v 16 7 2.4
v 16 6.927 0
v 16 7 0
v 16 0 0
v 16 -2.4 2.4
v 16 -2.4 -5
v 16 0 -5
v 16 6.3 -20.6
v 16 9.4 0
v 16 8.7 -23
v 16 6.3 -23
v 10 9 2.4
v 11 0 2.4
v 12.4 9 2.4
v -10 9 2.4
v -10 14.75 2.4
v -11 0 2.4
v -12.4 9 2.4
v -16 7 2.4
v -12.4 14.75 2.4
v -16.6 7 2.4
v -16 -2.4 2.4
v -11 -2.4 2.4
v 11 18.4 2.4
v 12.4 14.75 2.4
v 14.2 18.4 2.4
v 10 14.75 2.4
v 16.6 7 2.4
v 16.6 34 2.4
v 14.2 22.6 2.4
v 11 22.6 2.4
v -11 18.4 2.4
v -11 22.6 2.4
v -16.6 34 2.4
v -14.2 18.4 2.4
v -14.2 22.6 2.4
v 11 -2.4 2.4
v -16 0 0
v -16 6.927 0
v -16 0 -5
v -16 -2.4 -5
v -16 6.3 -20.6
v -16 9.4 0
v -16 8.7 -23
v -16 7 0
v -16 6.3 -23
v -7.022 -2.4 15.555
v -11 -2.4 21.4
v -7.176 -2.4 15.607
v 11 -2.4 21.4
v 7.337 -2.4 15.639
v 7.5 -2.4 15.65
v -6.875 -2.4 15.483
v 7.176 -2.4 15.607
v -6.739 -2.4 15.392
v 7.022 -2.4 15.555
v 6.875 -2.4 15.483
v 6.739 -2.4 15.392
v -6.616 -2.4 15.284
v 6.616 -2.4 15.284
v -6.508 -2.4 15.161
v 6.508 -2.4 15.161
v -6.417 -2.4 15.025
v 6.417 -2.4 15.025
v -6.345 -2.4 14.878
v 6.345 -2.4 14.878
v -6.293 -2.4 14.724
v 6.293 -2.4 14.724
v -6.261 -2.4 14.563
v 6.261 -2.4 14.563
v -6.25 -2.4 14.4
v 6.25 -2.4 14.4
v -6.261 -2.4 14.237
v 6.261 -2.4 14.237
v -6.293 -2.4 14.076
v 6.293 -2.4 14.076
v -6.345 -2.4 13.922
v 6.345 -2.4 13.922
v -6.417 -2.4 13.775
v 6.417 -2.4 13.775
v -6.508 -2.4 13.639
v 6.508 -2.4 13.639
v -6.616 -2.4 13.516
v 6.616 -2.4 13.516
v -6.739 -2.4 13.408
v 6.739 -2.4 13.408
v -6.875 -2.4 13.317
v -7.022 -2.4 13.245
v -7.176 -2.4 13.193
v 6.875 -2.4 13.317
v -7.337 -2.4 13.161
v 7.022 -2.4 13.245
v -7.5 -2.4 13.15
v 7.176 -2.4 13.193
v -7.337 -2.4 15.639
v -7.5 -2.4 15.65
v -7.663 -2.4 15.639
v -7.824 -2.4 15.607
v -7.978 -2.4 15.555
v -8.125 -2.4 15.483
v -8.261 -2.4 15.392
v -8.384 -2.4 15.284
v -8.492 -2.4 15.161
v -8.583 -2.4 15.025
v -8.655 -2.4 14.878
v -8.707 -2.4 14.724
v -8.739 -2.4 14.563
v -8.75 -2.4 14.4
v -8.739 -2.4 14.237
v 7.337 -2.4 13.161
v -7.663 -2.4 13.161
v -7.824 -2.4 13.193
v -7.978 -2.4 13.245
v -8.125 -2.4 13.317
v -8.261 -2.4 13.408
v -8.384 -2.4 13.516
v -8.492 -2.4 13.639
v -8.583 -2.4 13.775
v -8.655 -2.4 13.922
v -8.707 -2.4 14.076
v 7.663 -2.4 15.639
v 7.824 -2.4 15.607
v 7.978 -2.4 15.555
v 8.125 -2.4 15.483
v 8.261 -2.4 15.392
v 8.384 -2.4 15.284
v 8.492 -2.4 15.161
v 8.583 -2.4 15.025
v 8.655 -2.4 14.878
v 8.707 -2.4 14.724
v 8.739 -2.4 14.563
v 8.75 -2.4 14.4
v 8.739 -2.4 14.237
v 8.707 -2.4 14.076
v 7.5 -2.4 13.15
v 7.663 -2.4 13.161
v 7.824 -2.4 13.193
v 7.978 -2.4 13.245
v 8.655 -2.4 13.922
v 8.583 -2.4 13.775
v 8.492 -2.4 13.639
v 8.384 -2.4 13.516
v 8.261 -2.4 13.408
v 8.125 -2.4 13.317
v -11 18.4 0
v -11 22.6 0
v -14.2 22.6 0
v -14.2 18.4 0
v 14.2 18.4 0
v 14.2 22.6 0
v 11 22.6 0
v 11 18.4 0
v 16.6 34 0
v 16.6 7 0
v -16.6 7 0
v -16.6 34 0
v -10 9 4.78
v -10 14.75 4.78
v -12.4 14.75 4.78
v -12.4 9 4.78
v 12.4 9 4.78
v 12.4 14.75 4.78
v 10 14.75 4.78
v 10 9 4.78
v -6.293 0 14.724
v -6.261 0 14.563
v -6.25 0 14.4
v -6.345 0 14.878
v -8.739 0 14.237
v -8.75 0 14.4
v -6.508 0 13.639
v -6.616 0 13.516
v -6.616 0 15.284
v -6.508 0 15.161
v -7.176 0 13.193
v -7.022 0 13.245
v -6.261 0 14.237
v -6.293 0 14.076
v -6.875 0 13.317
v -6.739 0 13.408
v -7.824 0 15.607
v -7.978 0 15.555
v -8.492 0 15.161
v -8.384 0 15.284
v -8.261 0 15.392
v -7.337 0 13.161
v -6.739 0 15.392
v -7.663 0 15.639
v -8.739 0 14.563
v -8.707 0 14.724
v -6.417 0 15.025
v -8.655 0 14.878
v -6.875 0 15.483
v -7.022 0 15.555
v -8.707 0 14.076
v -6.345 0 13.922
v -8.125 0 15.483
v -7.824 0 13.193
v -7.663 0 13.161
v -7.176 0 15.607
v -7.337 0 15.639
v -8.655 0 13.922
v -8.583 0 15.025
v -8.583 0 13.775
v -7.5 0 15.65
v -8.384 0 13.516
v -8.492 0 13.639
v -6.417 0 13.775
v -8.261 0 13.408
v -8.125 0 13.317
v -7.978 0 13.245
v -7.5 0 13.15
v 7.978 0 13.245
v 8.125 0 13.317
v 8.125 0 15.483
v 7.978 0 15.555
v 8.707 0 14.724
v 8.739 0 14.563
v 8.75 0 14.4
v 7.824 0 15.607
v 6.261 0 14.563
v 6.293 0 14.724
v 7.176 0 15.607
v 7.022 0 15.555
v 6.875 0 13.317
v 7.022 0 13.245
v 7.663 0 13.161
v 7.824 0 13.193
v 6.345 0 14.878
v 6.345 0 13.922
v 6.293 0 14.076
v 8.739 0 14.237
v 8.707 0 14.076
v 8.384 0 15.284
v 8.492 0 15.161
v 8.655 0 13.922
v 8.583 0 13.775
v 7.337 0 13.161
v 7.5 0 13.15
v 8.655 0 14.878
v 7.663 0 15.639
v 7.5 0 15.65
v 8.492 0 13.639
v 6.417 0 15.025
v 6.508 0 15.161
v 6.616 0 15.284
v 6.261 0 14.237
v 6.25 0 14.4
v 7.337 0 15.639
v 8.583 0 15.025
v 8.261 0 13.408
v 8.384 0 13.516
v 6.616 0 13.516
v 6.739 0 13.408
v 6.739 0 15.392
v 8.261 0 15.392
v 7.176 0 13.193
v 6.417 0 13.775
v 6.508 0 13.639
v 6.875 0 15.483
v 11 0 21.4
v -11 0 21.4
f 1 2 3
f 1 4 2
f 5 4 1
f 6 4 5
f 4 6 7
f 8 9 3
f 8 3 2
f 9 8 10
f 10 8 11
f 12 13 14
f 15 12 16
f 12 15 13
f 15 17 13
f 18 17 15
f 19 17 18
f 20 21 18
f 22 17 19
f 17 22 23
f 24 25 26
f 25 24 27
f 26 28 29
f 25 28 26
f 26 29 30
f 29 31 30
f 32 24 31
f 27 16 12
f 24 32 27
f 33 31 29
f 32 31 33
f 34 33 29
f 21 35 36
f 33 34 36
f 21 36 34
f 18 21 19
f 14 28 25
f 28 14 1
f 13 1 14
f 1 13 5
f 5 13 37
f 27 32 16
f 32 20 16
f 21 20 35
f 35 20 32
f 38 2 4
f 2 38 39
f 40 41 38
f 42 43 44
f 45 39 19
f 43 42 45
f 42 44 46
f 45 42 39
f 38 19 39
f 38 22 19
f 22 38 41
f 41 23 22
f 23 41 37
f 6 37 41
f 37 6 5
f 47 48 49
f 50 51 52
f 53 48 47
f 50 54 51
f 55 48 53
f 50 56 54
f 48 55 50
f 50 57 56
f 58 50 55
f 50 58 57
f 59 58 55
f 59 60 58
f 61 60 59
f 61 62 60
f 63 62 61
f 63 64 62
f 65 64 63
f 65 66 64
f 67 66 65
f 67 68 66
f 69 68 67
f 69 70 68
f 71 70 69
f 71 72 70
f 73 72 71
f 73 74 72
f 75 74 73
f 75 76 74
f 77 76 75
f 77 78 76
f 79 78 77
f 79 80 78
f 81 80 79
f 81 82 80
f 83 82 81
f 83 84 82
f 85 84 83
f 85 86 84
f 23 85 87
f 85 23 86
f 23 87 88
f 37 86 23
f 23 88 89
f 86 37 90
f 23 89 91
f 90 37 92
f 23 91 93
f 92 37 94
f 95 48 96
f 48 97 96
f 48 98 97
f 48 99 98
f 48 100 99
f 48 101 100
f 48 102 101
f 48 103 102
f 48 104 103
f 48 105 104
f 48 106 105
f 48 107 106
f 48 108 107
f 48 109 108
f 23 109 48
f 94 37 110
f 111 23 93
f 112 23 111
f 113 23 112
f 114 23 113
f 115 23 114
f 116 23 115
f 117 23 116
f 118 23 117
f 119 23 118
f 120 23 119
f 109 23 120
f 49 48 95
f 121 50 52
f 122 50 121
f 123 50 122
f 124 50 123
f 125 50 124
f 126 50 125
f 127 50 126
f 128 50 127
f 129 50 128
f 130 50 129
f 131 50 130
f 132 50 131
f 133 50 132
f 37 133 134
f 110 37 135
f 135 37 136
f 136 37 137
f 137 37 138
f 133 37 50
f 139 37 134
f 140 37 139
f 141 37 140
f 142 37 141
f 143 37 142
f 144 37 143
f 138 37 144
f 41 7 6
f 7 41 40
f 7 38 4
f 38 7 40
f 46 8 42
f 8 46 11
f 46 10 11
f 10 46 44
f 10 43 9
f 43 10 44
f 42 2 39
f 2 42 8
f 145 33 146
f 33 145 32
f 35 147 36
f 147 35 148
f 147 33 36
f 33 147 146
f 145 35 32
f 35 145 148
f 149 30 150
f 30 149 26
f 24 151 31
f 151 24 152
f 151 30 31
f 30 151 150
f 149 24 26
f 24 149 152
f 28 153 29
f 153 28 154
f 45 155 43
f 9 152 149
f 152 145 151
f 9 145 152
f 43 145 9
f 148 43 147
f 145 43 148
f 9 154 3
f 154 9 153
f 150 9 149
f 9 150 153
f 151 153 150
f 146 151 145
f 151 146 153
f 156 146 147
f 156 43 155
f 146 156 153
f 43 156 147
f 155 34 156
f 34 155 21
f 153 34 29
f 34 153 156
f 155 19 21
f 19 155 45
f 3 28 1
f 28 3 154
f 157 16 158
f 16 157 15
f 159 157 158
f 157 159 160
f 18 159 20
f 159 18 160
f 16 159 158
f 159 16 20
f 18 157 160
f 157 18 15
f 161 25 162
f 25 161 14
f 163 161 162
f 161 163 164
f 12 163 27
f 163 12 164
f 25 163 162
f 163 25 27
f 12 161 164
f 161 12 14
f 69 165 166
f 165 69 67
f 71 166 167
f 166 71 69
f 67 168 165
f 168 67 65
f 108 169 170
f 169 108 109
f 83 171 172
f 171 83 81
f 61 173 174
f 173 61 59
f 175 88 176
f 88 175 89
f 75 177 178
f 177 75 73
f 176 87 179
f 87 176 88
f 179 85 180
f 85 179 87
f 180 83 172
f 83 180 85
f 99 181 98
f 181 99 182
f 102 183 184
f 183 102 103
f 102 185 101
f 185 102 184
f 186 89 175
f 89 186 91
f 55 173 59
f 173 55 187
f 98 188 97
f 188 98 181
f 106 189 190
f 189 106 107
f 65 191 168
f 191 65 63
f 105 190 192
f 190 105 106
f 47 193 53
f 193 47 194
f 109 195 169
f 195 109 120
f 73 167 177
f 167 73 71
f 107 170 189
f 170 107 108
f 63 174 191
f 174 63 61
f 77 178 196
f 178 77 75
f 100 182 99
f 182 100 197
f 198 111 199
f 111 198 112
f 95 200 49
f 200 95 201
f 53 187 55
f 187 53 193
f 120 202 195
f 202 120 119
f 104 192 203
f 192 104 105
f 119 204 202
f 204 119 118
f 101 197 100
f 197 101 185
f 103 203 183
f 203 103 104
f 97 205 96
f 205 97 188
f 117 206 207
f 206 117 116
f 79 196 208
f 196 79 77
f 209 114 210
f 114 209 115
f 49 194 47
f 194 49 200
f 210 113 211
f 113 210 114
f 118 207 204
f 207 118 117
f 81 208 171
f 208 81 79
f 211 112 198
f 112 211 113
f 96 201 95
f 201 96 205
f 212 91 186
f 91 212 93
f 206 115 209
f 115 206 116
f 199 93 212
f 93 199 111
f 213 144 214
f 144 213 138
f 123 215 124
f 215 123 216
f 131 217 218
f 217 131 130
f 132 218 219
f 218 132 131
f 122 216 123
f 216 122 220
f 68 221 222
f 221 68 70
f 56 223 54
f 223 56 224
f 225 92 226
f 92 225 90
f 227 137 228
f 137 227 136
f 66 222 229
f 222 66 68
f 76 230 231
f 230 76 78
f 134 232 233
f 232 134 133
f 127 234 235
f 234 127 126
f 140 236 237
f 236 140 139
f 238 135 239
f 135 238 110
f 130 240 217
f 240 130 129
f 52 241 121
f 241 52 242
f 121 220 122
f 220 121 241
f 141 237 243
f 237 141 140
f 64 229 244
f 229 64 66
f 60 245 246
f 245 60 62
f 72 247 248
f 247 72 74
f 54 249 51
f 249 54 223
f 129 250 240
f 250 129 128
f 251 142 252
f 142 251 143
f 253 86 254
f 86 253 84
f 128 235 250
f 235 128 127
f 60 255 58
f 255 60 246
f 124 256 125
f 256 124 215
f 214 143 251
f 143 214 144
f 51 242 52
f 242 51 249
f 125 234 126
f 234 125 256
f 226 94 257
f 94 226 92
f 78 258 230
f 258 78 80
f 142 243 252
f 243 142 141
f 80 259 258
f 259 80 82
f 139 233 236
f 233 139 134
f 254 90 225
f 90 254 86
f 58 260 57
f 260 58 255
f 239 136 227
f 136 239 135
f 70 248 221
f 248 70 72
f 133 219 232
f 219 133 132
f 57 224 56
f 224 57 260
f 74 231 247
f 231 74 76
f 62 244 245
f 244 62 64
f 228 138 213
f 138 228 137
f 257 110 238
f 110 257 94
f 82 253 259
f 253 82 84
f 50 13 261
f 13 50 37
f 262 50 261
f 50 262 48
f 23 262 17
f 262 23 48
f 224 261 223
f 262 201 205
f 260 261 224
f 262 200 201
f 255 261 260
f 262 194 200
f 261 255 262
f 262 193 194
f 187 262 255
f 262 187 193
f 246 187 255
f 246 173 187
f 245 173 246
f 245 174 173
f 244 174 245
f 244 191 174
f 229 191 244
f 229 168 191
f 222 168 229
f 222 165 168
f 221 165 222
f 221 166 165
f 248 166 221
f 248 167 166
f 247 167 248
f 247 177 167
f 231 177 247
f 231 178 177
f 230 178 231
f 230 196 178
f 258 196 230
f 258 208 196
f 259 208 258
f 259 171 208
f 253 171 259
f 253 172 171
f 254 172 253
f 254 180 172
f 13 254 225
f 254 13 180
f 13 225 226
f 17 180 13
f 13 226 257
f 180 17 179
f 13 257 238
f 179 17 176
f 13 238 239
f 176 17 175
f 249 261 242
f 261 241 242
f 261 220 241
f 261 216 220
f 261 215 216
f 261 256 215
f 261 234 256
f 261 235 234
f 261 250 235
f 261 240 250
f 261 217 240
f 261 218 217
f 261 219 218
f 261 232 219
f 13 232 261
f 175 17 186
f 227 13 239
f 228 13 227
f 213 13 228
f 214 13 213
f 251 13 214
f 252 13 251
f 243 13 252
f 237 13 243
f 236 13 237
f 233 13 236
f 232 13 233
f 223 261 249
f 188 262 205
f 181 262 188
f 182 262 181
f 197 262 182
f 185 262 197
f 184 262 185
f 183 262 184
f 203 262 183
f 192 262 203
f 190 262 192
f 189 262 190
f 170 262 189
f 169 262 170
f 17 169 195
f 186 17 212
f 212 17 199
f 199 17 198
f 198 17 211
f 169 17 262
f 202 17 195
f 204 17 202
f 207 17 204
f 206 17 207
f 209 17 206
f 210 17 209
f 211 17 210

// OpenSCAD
// OpenSCAD (кодон гурван хэмжээст загварчлал). Бүх хэмжээ миллиметрээр.
// Х тэнхлэг дэлгэцийн ирмэг дагуу, урд тал −Y, дээш +Z байна.
// Арын урт уян хавчаарт эсгий нааж, урд богино уруулыг дэлгэцийн хүрээнд тулгана.
// Камерыг халхлахгүй хажуу талд байрлуулж, хоёр линзийн төвийн зөрүүг бодитоор хэмжинэ.
// Мэдрэгчийг урд тавцанд линзийг гадагш харуулан, хоёр шураг болон тусгаарлагчаар тогтооно.
// Арын хавтанг нарийн хуванцар бүслүүрээр ороож хоёр завсраар сүвлэнэ. Холбогчийн үзүүр нээлттэй.
screen_thickness = 6;
lining_allowance = 1;
wall = 2.4;
clip_width = 32;
front_lip = 5;
back_lip = 23;
spring_grip = 0.7;
board_width = 18;
board_length = 23;
board_margin = 2;
sensor_width = 22;
sensor_height = 19;
hole_pitch = 15;
hole_diameter = 2.5;
hole_z = 12;
tie_width = 3.2;
gap = screen_thickness + lining_allowance;
tray_width = board_width + 2*board_margin + 2*(tie_width + wall);
eps = 0.02;
$fn = 48;

assert(gap > spring_grip && spring_grip >= 0 && wall >= 1.2);
assert(clip_width >= sensor_width && sensor_width > hole_pitch + hole_diameter);
assert(hole_z > hole_diameter && sensor_height > hole_z + hole_diameter);
assert(board_length > 2*wall && tie_width > 0);

module clip() {
    // Дээд гүүр, урд уруул, арын доод үзүүрийн уян шахалт.
    translate([-clip_width/2, -wall, 0]) cube([clip_width, gap + 2*wall, wall]);
    translate([-clip_width/2, -wall, -front_lip]) cube([clip_width, wall, front_lip + eps]);
    hull() {
        translate([-clip_width/2, gap, 0]) cube([clip_width, wall, wall]);
        translate([-clip_width/2, gap - spring_grip, -back_lip]) cube([clip_width, wall, wall]);
    }
}

module sensor_plate() {
    difference() {
        translate([-sensor_width/2, -wall, wall-eps])
            cube([sensor_width, wall, sensor_height+eps]);
        for (x = [-hole_pitch/2, hole_pitch/2])
            translate([x, eps, wall + hole_z]) rotate([90, 0, 0])
                cylinder(h=wall + 2*eps, d=hole_diameter);
    }
}

module board_tray() {
    tray_length = board_length + 2*board_margin;
    difference() {
        translate([-tray_width/2, gap, 0]) cube([tray_width, tray_length, wall]);
        for (sign = [-1, 1])
            translate([sign*(board_width/2 + board_margin + tie_width/2),
                       gap + tray_length/2, wall/2])
                cube([tie_width, 4.2, wall + 2*eps], center=true);
    }
    // Хоёр нам хашлага хавтангийн хажуугийн гулсалтыг хязгаарлана.
    for (sign = [-1, 1])
        translate([sign*(board_width/2 + board_margin/2 + wall/2),
                   gap + board_margin, wall - eps])
            translate([-wall/2, 0, 0]) cube([wall, board_length/4, wall]);
}

union() {
    clip();
    board_tray();
    sensor_plate();
}
